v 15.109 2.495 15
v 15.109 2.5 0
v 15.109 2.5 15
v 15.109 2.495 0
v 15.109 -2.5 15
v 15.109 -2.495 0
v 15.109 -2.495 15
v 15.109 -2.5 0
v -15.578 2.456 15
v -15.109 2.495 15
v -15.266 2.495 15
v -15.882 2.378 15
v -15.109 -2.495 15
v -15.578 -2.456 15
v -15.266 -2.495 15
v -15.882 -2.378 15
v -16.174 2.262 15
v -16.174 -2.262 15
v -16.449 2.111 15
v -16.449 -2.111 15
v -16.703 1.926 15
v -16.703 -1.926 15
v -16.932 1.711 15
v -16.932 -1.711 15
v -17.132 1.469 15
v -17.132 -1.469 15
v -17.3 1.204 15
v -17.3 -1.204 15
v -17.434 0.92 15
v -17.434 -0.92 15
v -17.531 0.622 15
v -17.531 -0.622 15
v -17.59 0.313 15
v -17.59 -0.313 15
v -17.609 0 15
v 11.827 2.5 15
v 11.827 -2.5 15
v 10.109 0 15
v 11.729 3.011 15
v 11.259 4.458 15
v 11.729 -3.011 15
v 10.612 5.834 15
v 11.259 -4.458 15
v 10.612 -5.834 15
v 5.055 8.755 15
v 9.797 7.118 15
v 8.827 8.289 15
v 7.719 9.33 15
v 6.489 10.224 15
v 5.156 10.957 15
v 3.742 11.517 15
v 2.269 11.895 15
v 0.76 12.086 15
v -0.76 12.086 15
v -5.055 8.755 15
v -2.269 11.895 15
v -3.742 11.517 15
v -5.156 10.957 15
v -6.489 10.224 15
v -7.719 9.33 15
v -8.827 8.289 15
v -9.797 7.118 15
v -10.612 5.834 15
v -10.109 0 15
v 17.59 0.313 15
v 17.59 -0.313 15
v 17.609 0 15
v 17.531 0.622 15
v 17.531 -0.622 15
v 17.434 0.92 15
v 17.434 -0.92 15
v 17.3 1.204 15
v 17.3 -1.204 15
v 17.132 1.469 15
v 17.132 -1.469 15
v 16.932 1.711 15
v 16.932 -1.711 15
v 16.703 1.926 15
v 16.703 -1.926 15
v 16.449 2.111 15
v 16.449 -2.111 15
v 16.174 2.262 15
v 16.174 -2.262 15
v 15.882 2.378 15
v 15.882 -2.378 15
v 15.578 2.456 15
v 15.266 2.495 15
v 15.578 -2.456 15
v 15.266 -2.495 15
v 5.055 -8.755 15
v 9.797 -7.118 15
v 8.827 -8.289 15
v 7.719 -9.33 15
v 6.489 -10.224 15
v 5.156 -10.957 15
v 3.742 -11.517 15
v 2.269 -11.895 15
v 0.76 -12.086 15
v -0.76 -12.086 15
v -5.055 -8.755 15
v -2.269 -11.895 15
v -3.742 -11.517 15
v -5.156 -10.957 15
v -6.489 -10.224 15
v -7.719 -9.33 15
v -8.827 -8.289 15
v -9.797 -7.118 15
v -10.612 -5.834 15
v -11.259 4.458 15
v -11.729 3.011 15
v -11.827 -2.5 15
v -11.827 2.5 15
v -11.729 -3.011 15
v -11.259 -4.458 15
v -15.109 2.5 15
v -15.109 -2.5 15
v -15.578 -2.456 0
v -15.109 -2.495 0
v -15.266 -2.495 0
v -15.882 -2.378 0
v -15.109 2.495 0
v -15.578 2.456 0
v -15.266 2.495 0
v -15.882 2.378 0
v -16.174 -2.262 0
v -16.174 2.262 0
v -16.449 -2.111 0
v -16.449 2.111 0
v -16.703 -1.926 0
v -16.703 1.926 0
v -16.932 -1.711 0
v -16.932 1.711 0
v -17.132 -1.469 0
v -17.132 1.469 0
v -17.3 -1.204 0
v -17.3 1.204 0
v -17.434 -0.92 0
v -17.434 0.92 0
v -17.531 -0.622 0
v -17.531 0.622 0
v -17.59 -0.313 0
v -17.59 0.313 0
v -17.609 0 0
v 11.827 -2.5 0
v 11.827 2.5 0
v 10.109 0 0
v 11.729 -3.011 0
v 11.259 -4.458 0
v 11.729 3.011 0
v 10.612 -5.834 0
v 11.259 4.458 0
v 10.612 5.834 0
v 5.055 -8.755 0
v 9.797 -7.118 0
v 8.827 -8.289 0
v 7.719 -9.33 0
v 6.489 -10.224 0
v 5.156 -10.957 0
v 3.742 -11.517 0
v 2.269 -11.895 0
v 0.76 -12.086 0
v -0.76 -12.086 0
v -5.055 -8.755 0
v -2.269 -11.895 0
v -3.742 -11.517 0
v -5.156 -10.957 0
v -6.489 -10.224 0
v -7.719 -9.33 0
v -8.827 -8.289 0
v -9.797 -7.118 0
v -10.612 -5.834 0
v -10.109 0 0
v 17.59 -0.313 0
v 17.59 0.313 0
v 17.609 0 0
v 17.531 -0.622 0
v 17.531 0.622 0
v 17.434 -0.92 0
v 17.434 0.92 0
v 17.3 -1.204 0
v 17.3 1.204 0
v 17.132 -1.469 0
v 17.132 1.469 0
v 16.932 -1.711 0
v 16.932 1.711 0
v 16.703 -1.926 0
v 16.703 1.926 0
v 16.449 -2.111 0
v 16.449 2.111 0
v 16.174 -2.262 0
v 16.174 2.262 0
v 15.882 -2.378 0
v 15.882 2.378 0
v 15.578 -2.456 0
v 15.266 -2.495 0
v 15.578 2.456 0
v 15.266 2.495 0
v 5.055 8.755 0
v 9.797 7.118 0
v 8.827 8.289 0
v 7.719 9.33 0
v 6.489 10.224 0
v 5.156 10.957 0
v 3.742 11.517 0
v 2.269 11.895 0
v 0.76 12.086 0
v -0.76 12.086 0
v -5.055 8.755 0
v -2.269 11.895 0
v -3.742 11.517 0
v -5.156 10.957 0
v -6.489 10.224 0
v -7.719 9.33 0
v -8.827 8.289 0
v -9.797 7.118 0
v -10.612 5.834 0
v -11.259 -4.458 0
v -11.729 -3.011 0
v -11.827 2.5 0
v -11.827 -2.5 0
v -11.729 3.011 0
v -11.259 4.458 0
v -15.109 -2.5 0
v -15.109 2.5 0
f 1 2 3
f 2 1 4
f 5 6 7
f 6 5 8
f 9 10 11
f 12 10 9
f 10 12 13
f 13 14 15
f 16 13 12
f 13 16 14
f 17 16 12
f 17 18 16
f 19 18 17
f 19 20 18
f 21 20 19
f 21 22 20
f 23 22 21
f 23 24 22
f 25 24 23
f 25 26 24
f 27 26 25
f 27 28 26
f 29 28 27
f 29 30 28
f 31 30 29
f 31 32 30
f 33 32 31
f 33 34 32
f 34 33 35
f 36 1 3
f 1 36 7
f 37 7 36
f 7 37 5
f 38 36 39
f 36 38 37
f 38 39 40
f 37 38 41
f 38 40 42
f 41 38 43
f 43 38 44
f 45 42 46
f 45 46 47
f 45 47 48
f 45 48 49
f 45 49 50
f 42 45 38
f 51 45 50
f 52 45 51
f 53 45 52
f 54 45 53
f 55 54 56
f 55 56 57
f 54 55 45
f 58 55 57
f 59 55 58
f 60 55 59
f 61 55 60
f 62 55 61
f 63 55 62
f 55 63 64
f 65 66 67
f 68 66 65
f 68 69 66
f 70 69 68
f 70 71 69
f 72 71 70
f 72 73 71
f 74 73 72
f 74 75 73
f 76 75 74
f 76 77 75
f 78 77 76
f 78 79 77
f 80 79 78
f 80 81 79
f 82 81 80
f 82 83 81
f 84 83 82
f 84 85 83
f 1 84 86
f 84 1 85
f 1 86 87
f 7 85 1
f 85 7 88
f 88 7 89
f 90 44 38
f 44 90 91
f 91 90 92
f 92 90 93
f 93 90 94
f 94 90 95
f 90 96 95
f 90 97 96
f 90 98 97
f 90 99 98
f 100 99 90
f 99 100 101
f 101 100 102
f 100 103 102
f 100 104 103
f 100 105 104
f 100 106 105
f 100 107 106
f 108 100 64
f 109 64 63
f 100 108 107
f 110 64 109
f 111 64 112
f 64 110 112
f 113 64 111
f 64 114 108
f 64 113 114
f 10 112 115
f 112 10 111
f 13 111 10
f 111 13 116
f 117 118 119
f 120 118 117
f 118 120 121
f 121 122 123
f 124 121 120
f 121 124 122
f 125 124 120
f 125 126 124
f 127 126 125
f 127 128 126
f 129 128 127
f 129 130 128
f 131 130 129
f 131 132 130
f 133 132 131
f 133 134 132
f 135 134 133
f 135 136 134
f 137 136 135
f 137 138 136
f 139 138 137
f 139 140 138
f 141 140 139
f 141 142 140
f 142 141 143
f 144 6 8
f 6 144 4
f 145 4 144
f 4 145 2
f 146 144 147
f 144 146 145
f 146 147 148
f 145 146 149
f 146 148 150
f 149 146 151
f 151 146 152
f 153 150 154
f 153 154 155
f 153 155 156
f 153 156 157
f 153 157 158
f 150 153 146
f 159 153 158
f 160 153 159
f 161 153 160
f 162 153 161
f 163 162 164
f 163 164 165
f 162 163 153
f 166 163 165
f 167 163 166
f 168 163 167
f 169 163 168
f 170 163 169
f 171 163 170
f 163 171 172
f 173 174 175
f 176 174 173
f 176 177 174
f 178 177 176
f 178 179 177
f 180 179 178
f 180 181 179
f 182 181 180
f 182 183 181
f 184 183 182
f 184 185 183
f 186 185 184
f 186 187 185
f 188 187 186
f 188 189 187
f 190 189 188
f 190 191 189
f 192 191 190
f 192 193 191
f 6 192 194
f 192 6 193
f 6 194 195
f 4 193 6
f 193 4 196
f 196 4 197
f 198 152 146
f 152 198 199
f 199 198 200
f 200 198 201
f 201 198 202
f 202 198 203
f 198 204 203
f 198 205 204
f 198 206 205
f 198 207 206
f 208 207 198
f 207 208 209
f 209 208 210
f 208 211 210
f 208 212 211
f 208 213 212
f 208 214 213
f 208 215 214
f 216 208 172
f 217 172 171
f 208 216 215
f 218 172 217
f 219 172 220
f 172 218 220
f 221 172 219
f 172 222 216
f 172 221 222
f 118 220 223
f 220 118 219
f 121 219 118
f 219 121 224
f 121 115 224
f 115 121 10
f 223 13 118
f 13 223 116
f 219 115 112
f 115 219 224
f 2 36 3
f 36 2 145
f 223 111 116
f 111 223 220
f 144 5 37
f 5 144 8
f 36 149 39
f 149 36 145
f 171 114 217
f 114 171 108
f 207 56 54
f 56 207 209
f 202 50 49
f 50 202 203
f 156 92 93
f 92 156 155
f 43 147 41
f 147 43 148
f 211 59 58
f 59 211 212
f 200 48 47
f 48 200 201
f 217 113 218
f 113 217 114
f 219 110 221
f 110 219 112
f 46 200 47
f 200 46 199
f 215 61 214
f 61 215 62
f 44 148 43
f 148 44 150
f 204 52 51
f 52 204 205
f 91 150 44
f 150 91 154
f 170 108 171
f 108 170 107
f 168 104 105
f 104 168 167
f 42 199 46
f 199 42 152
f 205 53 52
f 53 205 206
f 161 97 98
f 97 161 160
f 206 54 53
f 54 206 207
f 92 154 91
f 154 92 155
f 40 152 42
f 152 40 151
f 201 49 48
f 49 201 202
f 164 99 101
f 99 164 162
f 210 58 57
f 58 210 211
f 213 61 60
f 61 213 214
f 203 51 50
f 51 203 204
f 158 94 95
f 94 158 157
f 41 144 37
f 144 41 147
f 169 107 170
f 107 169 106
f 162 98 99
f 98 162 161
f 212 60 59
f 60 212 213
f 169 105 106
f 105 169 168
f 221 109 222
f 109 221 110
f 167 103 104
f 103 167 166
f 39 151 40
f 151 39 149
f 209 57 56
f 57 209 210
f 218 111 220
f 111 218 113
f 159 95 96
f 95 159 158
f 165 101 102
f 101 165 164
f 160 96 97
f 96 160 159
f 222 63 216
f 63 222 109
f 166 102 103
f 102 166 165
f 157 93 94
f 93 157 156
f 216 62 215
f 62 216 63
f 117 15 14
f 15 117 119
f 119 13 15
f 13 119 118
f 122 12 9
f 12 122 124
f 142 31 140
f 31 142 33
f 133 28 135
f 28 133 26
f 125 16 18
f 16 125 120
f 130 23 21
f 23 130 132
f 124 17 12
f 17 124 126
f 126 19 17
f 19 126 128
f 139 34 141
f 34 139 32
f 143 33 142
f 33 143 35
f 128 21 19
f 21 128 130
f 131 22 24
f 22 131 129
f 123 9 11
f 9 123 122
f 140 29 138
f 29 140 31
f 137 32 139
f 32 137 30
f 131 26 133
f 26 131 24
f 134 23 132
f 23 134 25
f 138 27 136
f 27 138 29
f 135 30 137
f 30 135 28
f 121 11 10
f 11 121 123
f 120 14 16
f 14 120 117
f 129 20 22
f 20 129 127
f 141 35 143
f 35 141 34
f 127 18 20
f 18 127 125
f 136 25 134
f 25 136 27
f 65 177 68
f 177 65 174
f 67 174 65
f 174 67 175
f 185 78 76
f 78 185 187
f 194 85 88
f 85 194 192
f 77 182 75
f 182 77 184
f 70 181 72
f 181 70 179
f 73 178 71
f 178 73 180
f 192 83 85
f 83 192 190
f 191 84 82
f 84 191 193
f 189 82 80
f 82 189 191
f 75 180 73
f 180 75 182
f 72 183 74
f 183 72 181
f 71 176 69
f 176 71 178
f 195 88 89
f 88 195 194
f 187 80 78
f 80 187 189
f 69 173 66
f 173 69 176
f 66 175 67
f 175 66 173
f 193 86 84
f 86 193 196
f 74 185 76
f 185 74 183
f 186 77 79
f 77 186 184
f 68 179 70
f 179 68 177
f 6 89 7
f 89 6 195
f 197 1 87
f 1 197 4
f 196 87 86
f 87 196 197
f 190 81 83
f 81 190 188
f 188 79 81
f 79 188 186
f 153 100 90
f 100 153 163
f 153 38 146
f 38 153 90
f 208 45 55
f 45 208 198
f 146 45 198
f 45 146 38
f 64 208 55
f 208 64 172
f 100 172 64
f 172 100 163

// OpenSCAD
/* socketTool1.scad */
/* This is the hex size in mm */
size = 17;

/* This is the total height of the tool */
height = 15;

/* No need to touch this stuff... */
$fn = 50;
d = 2*1.03*size/sqrt(3);
handle_total_l = d+2+4*2;
handleh = 15;
handle_thick = 5;

difference(){
    union(){
        translate([-handle_total_l/2,-handle_thick/2,0])cube([handle_total_l,handle_thick,handleh]);
        cylinder(h = height, d=d+4);
        translate([-handle_total_l/2,0,0])cylinder(d = handle_thick, h = handleh);
        translate([handle_total_l/2,0,0])cylinder(d = handle_thick, h = handleh);
    }
    cylinder($fn = 6, h = height, d=d);
}
